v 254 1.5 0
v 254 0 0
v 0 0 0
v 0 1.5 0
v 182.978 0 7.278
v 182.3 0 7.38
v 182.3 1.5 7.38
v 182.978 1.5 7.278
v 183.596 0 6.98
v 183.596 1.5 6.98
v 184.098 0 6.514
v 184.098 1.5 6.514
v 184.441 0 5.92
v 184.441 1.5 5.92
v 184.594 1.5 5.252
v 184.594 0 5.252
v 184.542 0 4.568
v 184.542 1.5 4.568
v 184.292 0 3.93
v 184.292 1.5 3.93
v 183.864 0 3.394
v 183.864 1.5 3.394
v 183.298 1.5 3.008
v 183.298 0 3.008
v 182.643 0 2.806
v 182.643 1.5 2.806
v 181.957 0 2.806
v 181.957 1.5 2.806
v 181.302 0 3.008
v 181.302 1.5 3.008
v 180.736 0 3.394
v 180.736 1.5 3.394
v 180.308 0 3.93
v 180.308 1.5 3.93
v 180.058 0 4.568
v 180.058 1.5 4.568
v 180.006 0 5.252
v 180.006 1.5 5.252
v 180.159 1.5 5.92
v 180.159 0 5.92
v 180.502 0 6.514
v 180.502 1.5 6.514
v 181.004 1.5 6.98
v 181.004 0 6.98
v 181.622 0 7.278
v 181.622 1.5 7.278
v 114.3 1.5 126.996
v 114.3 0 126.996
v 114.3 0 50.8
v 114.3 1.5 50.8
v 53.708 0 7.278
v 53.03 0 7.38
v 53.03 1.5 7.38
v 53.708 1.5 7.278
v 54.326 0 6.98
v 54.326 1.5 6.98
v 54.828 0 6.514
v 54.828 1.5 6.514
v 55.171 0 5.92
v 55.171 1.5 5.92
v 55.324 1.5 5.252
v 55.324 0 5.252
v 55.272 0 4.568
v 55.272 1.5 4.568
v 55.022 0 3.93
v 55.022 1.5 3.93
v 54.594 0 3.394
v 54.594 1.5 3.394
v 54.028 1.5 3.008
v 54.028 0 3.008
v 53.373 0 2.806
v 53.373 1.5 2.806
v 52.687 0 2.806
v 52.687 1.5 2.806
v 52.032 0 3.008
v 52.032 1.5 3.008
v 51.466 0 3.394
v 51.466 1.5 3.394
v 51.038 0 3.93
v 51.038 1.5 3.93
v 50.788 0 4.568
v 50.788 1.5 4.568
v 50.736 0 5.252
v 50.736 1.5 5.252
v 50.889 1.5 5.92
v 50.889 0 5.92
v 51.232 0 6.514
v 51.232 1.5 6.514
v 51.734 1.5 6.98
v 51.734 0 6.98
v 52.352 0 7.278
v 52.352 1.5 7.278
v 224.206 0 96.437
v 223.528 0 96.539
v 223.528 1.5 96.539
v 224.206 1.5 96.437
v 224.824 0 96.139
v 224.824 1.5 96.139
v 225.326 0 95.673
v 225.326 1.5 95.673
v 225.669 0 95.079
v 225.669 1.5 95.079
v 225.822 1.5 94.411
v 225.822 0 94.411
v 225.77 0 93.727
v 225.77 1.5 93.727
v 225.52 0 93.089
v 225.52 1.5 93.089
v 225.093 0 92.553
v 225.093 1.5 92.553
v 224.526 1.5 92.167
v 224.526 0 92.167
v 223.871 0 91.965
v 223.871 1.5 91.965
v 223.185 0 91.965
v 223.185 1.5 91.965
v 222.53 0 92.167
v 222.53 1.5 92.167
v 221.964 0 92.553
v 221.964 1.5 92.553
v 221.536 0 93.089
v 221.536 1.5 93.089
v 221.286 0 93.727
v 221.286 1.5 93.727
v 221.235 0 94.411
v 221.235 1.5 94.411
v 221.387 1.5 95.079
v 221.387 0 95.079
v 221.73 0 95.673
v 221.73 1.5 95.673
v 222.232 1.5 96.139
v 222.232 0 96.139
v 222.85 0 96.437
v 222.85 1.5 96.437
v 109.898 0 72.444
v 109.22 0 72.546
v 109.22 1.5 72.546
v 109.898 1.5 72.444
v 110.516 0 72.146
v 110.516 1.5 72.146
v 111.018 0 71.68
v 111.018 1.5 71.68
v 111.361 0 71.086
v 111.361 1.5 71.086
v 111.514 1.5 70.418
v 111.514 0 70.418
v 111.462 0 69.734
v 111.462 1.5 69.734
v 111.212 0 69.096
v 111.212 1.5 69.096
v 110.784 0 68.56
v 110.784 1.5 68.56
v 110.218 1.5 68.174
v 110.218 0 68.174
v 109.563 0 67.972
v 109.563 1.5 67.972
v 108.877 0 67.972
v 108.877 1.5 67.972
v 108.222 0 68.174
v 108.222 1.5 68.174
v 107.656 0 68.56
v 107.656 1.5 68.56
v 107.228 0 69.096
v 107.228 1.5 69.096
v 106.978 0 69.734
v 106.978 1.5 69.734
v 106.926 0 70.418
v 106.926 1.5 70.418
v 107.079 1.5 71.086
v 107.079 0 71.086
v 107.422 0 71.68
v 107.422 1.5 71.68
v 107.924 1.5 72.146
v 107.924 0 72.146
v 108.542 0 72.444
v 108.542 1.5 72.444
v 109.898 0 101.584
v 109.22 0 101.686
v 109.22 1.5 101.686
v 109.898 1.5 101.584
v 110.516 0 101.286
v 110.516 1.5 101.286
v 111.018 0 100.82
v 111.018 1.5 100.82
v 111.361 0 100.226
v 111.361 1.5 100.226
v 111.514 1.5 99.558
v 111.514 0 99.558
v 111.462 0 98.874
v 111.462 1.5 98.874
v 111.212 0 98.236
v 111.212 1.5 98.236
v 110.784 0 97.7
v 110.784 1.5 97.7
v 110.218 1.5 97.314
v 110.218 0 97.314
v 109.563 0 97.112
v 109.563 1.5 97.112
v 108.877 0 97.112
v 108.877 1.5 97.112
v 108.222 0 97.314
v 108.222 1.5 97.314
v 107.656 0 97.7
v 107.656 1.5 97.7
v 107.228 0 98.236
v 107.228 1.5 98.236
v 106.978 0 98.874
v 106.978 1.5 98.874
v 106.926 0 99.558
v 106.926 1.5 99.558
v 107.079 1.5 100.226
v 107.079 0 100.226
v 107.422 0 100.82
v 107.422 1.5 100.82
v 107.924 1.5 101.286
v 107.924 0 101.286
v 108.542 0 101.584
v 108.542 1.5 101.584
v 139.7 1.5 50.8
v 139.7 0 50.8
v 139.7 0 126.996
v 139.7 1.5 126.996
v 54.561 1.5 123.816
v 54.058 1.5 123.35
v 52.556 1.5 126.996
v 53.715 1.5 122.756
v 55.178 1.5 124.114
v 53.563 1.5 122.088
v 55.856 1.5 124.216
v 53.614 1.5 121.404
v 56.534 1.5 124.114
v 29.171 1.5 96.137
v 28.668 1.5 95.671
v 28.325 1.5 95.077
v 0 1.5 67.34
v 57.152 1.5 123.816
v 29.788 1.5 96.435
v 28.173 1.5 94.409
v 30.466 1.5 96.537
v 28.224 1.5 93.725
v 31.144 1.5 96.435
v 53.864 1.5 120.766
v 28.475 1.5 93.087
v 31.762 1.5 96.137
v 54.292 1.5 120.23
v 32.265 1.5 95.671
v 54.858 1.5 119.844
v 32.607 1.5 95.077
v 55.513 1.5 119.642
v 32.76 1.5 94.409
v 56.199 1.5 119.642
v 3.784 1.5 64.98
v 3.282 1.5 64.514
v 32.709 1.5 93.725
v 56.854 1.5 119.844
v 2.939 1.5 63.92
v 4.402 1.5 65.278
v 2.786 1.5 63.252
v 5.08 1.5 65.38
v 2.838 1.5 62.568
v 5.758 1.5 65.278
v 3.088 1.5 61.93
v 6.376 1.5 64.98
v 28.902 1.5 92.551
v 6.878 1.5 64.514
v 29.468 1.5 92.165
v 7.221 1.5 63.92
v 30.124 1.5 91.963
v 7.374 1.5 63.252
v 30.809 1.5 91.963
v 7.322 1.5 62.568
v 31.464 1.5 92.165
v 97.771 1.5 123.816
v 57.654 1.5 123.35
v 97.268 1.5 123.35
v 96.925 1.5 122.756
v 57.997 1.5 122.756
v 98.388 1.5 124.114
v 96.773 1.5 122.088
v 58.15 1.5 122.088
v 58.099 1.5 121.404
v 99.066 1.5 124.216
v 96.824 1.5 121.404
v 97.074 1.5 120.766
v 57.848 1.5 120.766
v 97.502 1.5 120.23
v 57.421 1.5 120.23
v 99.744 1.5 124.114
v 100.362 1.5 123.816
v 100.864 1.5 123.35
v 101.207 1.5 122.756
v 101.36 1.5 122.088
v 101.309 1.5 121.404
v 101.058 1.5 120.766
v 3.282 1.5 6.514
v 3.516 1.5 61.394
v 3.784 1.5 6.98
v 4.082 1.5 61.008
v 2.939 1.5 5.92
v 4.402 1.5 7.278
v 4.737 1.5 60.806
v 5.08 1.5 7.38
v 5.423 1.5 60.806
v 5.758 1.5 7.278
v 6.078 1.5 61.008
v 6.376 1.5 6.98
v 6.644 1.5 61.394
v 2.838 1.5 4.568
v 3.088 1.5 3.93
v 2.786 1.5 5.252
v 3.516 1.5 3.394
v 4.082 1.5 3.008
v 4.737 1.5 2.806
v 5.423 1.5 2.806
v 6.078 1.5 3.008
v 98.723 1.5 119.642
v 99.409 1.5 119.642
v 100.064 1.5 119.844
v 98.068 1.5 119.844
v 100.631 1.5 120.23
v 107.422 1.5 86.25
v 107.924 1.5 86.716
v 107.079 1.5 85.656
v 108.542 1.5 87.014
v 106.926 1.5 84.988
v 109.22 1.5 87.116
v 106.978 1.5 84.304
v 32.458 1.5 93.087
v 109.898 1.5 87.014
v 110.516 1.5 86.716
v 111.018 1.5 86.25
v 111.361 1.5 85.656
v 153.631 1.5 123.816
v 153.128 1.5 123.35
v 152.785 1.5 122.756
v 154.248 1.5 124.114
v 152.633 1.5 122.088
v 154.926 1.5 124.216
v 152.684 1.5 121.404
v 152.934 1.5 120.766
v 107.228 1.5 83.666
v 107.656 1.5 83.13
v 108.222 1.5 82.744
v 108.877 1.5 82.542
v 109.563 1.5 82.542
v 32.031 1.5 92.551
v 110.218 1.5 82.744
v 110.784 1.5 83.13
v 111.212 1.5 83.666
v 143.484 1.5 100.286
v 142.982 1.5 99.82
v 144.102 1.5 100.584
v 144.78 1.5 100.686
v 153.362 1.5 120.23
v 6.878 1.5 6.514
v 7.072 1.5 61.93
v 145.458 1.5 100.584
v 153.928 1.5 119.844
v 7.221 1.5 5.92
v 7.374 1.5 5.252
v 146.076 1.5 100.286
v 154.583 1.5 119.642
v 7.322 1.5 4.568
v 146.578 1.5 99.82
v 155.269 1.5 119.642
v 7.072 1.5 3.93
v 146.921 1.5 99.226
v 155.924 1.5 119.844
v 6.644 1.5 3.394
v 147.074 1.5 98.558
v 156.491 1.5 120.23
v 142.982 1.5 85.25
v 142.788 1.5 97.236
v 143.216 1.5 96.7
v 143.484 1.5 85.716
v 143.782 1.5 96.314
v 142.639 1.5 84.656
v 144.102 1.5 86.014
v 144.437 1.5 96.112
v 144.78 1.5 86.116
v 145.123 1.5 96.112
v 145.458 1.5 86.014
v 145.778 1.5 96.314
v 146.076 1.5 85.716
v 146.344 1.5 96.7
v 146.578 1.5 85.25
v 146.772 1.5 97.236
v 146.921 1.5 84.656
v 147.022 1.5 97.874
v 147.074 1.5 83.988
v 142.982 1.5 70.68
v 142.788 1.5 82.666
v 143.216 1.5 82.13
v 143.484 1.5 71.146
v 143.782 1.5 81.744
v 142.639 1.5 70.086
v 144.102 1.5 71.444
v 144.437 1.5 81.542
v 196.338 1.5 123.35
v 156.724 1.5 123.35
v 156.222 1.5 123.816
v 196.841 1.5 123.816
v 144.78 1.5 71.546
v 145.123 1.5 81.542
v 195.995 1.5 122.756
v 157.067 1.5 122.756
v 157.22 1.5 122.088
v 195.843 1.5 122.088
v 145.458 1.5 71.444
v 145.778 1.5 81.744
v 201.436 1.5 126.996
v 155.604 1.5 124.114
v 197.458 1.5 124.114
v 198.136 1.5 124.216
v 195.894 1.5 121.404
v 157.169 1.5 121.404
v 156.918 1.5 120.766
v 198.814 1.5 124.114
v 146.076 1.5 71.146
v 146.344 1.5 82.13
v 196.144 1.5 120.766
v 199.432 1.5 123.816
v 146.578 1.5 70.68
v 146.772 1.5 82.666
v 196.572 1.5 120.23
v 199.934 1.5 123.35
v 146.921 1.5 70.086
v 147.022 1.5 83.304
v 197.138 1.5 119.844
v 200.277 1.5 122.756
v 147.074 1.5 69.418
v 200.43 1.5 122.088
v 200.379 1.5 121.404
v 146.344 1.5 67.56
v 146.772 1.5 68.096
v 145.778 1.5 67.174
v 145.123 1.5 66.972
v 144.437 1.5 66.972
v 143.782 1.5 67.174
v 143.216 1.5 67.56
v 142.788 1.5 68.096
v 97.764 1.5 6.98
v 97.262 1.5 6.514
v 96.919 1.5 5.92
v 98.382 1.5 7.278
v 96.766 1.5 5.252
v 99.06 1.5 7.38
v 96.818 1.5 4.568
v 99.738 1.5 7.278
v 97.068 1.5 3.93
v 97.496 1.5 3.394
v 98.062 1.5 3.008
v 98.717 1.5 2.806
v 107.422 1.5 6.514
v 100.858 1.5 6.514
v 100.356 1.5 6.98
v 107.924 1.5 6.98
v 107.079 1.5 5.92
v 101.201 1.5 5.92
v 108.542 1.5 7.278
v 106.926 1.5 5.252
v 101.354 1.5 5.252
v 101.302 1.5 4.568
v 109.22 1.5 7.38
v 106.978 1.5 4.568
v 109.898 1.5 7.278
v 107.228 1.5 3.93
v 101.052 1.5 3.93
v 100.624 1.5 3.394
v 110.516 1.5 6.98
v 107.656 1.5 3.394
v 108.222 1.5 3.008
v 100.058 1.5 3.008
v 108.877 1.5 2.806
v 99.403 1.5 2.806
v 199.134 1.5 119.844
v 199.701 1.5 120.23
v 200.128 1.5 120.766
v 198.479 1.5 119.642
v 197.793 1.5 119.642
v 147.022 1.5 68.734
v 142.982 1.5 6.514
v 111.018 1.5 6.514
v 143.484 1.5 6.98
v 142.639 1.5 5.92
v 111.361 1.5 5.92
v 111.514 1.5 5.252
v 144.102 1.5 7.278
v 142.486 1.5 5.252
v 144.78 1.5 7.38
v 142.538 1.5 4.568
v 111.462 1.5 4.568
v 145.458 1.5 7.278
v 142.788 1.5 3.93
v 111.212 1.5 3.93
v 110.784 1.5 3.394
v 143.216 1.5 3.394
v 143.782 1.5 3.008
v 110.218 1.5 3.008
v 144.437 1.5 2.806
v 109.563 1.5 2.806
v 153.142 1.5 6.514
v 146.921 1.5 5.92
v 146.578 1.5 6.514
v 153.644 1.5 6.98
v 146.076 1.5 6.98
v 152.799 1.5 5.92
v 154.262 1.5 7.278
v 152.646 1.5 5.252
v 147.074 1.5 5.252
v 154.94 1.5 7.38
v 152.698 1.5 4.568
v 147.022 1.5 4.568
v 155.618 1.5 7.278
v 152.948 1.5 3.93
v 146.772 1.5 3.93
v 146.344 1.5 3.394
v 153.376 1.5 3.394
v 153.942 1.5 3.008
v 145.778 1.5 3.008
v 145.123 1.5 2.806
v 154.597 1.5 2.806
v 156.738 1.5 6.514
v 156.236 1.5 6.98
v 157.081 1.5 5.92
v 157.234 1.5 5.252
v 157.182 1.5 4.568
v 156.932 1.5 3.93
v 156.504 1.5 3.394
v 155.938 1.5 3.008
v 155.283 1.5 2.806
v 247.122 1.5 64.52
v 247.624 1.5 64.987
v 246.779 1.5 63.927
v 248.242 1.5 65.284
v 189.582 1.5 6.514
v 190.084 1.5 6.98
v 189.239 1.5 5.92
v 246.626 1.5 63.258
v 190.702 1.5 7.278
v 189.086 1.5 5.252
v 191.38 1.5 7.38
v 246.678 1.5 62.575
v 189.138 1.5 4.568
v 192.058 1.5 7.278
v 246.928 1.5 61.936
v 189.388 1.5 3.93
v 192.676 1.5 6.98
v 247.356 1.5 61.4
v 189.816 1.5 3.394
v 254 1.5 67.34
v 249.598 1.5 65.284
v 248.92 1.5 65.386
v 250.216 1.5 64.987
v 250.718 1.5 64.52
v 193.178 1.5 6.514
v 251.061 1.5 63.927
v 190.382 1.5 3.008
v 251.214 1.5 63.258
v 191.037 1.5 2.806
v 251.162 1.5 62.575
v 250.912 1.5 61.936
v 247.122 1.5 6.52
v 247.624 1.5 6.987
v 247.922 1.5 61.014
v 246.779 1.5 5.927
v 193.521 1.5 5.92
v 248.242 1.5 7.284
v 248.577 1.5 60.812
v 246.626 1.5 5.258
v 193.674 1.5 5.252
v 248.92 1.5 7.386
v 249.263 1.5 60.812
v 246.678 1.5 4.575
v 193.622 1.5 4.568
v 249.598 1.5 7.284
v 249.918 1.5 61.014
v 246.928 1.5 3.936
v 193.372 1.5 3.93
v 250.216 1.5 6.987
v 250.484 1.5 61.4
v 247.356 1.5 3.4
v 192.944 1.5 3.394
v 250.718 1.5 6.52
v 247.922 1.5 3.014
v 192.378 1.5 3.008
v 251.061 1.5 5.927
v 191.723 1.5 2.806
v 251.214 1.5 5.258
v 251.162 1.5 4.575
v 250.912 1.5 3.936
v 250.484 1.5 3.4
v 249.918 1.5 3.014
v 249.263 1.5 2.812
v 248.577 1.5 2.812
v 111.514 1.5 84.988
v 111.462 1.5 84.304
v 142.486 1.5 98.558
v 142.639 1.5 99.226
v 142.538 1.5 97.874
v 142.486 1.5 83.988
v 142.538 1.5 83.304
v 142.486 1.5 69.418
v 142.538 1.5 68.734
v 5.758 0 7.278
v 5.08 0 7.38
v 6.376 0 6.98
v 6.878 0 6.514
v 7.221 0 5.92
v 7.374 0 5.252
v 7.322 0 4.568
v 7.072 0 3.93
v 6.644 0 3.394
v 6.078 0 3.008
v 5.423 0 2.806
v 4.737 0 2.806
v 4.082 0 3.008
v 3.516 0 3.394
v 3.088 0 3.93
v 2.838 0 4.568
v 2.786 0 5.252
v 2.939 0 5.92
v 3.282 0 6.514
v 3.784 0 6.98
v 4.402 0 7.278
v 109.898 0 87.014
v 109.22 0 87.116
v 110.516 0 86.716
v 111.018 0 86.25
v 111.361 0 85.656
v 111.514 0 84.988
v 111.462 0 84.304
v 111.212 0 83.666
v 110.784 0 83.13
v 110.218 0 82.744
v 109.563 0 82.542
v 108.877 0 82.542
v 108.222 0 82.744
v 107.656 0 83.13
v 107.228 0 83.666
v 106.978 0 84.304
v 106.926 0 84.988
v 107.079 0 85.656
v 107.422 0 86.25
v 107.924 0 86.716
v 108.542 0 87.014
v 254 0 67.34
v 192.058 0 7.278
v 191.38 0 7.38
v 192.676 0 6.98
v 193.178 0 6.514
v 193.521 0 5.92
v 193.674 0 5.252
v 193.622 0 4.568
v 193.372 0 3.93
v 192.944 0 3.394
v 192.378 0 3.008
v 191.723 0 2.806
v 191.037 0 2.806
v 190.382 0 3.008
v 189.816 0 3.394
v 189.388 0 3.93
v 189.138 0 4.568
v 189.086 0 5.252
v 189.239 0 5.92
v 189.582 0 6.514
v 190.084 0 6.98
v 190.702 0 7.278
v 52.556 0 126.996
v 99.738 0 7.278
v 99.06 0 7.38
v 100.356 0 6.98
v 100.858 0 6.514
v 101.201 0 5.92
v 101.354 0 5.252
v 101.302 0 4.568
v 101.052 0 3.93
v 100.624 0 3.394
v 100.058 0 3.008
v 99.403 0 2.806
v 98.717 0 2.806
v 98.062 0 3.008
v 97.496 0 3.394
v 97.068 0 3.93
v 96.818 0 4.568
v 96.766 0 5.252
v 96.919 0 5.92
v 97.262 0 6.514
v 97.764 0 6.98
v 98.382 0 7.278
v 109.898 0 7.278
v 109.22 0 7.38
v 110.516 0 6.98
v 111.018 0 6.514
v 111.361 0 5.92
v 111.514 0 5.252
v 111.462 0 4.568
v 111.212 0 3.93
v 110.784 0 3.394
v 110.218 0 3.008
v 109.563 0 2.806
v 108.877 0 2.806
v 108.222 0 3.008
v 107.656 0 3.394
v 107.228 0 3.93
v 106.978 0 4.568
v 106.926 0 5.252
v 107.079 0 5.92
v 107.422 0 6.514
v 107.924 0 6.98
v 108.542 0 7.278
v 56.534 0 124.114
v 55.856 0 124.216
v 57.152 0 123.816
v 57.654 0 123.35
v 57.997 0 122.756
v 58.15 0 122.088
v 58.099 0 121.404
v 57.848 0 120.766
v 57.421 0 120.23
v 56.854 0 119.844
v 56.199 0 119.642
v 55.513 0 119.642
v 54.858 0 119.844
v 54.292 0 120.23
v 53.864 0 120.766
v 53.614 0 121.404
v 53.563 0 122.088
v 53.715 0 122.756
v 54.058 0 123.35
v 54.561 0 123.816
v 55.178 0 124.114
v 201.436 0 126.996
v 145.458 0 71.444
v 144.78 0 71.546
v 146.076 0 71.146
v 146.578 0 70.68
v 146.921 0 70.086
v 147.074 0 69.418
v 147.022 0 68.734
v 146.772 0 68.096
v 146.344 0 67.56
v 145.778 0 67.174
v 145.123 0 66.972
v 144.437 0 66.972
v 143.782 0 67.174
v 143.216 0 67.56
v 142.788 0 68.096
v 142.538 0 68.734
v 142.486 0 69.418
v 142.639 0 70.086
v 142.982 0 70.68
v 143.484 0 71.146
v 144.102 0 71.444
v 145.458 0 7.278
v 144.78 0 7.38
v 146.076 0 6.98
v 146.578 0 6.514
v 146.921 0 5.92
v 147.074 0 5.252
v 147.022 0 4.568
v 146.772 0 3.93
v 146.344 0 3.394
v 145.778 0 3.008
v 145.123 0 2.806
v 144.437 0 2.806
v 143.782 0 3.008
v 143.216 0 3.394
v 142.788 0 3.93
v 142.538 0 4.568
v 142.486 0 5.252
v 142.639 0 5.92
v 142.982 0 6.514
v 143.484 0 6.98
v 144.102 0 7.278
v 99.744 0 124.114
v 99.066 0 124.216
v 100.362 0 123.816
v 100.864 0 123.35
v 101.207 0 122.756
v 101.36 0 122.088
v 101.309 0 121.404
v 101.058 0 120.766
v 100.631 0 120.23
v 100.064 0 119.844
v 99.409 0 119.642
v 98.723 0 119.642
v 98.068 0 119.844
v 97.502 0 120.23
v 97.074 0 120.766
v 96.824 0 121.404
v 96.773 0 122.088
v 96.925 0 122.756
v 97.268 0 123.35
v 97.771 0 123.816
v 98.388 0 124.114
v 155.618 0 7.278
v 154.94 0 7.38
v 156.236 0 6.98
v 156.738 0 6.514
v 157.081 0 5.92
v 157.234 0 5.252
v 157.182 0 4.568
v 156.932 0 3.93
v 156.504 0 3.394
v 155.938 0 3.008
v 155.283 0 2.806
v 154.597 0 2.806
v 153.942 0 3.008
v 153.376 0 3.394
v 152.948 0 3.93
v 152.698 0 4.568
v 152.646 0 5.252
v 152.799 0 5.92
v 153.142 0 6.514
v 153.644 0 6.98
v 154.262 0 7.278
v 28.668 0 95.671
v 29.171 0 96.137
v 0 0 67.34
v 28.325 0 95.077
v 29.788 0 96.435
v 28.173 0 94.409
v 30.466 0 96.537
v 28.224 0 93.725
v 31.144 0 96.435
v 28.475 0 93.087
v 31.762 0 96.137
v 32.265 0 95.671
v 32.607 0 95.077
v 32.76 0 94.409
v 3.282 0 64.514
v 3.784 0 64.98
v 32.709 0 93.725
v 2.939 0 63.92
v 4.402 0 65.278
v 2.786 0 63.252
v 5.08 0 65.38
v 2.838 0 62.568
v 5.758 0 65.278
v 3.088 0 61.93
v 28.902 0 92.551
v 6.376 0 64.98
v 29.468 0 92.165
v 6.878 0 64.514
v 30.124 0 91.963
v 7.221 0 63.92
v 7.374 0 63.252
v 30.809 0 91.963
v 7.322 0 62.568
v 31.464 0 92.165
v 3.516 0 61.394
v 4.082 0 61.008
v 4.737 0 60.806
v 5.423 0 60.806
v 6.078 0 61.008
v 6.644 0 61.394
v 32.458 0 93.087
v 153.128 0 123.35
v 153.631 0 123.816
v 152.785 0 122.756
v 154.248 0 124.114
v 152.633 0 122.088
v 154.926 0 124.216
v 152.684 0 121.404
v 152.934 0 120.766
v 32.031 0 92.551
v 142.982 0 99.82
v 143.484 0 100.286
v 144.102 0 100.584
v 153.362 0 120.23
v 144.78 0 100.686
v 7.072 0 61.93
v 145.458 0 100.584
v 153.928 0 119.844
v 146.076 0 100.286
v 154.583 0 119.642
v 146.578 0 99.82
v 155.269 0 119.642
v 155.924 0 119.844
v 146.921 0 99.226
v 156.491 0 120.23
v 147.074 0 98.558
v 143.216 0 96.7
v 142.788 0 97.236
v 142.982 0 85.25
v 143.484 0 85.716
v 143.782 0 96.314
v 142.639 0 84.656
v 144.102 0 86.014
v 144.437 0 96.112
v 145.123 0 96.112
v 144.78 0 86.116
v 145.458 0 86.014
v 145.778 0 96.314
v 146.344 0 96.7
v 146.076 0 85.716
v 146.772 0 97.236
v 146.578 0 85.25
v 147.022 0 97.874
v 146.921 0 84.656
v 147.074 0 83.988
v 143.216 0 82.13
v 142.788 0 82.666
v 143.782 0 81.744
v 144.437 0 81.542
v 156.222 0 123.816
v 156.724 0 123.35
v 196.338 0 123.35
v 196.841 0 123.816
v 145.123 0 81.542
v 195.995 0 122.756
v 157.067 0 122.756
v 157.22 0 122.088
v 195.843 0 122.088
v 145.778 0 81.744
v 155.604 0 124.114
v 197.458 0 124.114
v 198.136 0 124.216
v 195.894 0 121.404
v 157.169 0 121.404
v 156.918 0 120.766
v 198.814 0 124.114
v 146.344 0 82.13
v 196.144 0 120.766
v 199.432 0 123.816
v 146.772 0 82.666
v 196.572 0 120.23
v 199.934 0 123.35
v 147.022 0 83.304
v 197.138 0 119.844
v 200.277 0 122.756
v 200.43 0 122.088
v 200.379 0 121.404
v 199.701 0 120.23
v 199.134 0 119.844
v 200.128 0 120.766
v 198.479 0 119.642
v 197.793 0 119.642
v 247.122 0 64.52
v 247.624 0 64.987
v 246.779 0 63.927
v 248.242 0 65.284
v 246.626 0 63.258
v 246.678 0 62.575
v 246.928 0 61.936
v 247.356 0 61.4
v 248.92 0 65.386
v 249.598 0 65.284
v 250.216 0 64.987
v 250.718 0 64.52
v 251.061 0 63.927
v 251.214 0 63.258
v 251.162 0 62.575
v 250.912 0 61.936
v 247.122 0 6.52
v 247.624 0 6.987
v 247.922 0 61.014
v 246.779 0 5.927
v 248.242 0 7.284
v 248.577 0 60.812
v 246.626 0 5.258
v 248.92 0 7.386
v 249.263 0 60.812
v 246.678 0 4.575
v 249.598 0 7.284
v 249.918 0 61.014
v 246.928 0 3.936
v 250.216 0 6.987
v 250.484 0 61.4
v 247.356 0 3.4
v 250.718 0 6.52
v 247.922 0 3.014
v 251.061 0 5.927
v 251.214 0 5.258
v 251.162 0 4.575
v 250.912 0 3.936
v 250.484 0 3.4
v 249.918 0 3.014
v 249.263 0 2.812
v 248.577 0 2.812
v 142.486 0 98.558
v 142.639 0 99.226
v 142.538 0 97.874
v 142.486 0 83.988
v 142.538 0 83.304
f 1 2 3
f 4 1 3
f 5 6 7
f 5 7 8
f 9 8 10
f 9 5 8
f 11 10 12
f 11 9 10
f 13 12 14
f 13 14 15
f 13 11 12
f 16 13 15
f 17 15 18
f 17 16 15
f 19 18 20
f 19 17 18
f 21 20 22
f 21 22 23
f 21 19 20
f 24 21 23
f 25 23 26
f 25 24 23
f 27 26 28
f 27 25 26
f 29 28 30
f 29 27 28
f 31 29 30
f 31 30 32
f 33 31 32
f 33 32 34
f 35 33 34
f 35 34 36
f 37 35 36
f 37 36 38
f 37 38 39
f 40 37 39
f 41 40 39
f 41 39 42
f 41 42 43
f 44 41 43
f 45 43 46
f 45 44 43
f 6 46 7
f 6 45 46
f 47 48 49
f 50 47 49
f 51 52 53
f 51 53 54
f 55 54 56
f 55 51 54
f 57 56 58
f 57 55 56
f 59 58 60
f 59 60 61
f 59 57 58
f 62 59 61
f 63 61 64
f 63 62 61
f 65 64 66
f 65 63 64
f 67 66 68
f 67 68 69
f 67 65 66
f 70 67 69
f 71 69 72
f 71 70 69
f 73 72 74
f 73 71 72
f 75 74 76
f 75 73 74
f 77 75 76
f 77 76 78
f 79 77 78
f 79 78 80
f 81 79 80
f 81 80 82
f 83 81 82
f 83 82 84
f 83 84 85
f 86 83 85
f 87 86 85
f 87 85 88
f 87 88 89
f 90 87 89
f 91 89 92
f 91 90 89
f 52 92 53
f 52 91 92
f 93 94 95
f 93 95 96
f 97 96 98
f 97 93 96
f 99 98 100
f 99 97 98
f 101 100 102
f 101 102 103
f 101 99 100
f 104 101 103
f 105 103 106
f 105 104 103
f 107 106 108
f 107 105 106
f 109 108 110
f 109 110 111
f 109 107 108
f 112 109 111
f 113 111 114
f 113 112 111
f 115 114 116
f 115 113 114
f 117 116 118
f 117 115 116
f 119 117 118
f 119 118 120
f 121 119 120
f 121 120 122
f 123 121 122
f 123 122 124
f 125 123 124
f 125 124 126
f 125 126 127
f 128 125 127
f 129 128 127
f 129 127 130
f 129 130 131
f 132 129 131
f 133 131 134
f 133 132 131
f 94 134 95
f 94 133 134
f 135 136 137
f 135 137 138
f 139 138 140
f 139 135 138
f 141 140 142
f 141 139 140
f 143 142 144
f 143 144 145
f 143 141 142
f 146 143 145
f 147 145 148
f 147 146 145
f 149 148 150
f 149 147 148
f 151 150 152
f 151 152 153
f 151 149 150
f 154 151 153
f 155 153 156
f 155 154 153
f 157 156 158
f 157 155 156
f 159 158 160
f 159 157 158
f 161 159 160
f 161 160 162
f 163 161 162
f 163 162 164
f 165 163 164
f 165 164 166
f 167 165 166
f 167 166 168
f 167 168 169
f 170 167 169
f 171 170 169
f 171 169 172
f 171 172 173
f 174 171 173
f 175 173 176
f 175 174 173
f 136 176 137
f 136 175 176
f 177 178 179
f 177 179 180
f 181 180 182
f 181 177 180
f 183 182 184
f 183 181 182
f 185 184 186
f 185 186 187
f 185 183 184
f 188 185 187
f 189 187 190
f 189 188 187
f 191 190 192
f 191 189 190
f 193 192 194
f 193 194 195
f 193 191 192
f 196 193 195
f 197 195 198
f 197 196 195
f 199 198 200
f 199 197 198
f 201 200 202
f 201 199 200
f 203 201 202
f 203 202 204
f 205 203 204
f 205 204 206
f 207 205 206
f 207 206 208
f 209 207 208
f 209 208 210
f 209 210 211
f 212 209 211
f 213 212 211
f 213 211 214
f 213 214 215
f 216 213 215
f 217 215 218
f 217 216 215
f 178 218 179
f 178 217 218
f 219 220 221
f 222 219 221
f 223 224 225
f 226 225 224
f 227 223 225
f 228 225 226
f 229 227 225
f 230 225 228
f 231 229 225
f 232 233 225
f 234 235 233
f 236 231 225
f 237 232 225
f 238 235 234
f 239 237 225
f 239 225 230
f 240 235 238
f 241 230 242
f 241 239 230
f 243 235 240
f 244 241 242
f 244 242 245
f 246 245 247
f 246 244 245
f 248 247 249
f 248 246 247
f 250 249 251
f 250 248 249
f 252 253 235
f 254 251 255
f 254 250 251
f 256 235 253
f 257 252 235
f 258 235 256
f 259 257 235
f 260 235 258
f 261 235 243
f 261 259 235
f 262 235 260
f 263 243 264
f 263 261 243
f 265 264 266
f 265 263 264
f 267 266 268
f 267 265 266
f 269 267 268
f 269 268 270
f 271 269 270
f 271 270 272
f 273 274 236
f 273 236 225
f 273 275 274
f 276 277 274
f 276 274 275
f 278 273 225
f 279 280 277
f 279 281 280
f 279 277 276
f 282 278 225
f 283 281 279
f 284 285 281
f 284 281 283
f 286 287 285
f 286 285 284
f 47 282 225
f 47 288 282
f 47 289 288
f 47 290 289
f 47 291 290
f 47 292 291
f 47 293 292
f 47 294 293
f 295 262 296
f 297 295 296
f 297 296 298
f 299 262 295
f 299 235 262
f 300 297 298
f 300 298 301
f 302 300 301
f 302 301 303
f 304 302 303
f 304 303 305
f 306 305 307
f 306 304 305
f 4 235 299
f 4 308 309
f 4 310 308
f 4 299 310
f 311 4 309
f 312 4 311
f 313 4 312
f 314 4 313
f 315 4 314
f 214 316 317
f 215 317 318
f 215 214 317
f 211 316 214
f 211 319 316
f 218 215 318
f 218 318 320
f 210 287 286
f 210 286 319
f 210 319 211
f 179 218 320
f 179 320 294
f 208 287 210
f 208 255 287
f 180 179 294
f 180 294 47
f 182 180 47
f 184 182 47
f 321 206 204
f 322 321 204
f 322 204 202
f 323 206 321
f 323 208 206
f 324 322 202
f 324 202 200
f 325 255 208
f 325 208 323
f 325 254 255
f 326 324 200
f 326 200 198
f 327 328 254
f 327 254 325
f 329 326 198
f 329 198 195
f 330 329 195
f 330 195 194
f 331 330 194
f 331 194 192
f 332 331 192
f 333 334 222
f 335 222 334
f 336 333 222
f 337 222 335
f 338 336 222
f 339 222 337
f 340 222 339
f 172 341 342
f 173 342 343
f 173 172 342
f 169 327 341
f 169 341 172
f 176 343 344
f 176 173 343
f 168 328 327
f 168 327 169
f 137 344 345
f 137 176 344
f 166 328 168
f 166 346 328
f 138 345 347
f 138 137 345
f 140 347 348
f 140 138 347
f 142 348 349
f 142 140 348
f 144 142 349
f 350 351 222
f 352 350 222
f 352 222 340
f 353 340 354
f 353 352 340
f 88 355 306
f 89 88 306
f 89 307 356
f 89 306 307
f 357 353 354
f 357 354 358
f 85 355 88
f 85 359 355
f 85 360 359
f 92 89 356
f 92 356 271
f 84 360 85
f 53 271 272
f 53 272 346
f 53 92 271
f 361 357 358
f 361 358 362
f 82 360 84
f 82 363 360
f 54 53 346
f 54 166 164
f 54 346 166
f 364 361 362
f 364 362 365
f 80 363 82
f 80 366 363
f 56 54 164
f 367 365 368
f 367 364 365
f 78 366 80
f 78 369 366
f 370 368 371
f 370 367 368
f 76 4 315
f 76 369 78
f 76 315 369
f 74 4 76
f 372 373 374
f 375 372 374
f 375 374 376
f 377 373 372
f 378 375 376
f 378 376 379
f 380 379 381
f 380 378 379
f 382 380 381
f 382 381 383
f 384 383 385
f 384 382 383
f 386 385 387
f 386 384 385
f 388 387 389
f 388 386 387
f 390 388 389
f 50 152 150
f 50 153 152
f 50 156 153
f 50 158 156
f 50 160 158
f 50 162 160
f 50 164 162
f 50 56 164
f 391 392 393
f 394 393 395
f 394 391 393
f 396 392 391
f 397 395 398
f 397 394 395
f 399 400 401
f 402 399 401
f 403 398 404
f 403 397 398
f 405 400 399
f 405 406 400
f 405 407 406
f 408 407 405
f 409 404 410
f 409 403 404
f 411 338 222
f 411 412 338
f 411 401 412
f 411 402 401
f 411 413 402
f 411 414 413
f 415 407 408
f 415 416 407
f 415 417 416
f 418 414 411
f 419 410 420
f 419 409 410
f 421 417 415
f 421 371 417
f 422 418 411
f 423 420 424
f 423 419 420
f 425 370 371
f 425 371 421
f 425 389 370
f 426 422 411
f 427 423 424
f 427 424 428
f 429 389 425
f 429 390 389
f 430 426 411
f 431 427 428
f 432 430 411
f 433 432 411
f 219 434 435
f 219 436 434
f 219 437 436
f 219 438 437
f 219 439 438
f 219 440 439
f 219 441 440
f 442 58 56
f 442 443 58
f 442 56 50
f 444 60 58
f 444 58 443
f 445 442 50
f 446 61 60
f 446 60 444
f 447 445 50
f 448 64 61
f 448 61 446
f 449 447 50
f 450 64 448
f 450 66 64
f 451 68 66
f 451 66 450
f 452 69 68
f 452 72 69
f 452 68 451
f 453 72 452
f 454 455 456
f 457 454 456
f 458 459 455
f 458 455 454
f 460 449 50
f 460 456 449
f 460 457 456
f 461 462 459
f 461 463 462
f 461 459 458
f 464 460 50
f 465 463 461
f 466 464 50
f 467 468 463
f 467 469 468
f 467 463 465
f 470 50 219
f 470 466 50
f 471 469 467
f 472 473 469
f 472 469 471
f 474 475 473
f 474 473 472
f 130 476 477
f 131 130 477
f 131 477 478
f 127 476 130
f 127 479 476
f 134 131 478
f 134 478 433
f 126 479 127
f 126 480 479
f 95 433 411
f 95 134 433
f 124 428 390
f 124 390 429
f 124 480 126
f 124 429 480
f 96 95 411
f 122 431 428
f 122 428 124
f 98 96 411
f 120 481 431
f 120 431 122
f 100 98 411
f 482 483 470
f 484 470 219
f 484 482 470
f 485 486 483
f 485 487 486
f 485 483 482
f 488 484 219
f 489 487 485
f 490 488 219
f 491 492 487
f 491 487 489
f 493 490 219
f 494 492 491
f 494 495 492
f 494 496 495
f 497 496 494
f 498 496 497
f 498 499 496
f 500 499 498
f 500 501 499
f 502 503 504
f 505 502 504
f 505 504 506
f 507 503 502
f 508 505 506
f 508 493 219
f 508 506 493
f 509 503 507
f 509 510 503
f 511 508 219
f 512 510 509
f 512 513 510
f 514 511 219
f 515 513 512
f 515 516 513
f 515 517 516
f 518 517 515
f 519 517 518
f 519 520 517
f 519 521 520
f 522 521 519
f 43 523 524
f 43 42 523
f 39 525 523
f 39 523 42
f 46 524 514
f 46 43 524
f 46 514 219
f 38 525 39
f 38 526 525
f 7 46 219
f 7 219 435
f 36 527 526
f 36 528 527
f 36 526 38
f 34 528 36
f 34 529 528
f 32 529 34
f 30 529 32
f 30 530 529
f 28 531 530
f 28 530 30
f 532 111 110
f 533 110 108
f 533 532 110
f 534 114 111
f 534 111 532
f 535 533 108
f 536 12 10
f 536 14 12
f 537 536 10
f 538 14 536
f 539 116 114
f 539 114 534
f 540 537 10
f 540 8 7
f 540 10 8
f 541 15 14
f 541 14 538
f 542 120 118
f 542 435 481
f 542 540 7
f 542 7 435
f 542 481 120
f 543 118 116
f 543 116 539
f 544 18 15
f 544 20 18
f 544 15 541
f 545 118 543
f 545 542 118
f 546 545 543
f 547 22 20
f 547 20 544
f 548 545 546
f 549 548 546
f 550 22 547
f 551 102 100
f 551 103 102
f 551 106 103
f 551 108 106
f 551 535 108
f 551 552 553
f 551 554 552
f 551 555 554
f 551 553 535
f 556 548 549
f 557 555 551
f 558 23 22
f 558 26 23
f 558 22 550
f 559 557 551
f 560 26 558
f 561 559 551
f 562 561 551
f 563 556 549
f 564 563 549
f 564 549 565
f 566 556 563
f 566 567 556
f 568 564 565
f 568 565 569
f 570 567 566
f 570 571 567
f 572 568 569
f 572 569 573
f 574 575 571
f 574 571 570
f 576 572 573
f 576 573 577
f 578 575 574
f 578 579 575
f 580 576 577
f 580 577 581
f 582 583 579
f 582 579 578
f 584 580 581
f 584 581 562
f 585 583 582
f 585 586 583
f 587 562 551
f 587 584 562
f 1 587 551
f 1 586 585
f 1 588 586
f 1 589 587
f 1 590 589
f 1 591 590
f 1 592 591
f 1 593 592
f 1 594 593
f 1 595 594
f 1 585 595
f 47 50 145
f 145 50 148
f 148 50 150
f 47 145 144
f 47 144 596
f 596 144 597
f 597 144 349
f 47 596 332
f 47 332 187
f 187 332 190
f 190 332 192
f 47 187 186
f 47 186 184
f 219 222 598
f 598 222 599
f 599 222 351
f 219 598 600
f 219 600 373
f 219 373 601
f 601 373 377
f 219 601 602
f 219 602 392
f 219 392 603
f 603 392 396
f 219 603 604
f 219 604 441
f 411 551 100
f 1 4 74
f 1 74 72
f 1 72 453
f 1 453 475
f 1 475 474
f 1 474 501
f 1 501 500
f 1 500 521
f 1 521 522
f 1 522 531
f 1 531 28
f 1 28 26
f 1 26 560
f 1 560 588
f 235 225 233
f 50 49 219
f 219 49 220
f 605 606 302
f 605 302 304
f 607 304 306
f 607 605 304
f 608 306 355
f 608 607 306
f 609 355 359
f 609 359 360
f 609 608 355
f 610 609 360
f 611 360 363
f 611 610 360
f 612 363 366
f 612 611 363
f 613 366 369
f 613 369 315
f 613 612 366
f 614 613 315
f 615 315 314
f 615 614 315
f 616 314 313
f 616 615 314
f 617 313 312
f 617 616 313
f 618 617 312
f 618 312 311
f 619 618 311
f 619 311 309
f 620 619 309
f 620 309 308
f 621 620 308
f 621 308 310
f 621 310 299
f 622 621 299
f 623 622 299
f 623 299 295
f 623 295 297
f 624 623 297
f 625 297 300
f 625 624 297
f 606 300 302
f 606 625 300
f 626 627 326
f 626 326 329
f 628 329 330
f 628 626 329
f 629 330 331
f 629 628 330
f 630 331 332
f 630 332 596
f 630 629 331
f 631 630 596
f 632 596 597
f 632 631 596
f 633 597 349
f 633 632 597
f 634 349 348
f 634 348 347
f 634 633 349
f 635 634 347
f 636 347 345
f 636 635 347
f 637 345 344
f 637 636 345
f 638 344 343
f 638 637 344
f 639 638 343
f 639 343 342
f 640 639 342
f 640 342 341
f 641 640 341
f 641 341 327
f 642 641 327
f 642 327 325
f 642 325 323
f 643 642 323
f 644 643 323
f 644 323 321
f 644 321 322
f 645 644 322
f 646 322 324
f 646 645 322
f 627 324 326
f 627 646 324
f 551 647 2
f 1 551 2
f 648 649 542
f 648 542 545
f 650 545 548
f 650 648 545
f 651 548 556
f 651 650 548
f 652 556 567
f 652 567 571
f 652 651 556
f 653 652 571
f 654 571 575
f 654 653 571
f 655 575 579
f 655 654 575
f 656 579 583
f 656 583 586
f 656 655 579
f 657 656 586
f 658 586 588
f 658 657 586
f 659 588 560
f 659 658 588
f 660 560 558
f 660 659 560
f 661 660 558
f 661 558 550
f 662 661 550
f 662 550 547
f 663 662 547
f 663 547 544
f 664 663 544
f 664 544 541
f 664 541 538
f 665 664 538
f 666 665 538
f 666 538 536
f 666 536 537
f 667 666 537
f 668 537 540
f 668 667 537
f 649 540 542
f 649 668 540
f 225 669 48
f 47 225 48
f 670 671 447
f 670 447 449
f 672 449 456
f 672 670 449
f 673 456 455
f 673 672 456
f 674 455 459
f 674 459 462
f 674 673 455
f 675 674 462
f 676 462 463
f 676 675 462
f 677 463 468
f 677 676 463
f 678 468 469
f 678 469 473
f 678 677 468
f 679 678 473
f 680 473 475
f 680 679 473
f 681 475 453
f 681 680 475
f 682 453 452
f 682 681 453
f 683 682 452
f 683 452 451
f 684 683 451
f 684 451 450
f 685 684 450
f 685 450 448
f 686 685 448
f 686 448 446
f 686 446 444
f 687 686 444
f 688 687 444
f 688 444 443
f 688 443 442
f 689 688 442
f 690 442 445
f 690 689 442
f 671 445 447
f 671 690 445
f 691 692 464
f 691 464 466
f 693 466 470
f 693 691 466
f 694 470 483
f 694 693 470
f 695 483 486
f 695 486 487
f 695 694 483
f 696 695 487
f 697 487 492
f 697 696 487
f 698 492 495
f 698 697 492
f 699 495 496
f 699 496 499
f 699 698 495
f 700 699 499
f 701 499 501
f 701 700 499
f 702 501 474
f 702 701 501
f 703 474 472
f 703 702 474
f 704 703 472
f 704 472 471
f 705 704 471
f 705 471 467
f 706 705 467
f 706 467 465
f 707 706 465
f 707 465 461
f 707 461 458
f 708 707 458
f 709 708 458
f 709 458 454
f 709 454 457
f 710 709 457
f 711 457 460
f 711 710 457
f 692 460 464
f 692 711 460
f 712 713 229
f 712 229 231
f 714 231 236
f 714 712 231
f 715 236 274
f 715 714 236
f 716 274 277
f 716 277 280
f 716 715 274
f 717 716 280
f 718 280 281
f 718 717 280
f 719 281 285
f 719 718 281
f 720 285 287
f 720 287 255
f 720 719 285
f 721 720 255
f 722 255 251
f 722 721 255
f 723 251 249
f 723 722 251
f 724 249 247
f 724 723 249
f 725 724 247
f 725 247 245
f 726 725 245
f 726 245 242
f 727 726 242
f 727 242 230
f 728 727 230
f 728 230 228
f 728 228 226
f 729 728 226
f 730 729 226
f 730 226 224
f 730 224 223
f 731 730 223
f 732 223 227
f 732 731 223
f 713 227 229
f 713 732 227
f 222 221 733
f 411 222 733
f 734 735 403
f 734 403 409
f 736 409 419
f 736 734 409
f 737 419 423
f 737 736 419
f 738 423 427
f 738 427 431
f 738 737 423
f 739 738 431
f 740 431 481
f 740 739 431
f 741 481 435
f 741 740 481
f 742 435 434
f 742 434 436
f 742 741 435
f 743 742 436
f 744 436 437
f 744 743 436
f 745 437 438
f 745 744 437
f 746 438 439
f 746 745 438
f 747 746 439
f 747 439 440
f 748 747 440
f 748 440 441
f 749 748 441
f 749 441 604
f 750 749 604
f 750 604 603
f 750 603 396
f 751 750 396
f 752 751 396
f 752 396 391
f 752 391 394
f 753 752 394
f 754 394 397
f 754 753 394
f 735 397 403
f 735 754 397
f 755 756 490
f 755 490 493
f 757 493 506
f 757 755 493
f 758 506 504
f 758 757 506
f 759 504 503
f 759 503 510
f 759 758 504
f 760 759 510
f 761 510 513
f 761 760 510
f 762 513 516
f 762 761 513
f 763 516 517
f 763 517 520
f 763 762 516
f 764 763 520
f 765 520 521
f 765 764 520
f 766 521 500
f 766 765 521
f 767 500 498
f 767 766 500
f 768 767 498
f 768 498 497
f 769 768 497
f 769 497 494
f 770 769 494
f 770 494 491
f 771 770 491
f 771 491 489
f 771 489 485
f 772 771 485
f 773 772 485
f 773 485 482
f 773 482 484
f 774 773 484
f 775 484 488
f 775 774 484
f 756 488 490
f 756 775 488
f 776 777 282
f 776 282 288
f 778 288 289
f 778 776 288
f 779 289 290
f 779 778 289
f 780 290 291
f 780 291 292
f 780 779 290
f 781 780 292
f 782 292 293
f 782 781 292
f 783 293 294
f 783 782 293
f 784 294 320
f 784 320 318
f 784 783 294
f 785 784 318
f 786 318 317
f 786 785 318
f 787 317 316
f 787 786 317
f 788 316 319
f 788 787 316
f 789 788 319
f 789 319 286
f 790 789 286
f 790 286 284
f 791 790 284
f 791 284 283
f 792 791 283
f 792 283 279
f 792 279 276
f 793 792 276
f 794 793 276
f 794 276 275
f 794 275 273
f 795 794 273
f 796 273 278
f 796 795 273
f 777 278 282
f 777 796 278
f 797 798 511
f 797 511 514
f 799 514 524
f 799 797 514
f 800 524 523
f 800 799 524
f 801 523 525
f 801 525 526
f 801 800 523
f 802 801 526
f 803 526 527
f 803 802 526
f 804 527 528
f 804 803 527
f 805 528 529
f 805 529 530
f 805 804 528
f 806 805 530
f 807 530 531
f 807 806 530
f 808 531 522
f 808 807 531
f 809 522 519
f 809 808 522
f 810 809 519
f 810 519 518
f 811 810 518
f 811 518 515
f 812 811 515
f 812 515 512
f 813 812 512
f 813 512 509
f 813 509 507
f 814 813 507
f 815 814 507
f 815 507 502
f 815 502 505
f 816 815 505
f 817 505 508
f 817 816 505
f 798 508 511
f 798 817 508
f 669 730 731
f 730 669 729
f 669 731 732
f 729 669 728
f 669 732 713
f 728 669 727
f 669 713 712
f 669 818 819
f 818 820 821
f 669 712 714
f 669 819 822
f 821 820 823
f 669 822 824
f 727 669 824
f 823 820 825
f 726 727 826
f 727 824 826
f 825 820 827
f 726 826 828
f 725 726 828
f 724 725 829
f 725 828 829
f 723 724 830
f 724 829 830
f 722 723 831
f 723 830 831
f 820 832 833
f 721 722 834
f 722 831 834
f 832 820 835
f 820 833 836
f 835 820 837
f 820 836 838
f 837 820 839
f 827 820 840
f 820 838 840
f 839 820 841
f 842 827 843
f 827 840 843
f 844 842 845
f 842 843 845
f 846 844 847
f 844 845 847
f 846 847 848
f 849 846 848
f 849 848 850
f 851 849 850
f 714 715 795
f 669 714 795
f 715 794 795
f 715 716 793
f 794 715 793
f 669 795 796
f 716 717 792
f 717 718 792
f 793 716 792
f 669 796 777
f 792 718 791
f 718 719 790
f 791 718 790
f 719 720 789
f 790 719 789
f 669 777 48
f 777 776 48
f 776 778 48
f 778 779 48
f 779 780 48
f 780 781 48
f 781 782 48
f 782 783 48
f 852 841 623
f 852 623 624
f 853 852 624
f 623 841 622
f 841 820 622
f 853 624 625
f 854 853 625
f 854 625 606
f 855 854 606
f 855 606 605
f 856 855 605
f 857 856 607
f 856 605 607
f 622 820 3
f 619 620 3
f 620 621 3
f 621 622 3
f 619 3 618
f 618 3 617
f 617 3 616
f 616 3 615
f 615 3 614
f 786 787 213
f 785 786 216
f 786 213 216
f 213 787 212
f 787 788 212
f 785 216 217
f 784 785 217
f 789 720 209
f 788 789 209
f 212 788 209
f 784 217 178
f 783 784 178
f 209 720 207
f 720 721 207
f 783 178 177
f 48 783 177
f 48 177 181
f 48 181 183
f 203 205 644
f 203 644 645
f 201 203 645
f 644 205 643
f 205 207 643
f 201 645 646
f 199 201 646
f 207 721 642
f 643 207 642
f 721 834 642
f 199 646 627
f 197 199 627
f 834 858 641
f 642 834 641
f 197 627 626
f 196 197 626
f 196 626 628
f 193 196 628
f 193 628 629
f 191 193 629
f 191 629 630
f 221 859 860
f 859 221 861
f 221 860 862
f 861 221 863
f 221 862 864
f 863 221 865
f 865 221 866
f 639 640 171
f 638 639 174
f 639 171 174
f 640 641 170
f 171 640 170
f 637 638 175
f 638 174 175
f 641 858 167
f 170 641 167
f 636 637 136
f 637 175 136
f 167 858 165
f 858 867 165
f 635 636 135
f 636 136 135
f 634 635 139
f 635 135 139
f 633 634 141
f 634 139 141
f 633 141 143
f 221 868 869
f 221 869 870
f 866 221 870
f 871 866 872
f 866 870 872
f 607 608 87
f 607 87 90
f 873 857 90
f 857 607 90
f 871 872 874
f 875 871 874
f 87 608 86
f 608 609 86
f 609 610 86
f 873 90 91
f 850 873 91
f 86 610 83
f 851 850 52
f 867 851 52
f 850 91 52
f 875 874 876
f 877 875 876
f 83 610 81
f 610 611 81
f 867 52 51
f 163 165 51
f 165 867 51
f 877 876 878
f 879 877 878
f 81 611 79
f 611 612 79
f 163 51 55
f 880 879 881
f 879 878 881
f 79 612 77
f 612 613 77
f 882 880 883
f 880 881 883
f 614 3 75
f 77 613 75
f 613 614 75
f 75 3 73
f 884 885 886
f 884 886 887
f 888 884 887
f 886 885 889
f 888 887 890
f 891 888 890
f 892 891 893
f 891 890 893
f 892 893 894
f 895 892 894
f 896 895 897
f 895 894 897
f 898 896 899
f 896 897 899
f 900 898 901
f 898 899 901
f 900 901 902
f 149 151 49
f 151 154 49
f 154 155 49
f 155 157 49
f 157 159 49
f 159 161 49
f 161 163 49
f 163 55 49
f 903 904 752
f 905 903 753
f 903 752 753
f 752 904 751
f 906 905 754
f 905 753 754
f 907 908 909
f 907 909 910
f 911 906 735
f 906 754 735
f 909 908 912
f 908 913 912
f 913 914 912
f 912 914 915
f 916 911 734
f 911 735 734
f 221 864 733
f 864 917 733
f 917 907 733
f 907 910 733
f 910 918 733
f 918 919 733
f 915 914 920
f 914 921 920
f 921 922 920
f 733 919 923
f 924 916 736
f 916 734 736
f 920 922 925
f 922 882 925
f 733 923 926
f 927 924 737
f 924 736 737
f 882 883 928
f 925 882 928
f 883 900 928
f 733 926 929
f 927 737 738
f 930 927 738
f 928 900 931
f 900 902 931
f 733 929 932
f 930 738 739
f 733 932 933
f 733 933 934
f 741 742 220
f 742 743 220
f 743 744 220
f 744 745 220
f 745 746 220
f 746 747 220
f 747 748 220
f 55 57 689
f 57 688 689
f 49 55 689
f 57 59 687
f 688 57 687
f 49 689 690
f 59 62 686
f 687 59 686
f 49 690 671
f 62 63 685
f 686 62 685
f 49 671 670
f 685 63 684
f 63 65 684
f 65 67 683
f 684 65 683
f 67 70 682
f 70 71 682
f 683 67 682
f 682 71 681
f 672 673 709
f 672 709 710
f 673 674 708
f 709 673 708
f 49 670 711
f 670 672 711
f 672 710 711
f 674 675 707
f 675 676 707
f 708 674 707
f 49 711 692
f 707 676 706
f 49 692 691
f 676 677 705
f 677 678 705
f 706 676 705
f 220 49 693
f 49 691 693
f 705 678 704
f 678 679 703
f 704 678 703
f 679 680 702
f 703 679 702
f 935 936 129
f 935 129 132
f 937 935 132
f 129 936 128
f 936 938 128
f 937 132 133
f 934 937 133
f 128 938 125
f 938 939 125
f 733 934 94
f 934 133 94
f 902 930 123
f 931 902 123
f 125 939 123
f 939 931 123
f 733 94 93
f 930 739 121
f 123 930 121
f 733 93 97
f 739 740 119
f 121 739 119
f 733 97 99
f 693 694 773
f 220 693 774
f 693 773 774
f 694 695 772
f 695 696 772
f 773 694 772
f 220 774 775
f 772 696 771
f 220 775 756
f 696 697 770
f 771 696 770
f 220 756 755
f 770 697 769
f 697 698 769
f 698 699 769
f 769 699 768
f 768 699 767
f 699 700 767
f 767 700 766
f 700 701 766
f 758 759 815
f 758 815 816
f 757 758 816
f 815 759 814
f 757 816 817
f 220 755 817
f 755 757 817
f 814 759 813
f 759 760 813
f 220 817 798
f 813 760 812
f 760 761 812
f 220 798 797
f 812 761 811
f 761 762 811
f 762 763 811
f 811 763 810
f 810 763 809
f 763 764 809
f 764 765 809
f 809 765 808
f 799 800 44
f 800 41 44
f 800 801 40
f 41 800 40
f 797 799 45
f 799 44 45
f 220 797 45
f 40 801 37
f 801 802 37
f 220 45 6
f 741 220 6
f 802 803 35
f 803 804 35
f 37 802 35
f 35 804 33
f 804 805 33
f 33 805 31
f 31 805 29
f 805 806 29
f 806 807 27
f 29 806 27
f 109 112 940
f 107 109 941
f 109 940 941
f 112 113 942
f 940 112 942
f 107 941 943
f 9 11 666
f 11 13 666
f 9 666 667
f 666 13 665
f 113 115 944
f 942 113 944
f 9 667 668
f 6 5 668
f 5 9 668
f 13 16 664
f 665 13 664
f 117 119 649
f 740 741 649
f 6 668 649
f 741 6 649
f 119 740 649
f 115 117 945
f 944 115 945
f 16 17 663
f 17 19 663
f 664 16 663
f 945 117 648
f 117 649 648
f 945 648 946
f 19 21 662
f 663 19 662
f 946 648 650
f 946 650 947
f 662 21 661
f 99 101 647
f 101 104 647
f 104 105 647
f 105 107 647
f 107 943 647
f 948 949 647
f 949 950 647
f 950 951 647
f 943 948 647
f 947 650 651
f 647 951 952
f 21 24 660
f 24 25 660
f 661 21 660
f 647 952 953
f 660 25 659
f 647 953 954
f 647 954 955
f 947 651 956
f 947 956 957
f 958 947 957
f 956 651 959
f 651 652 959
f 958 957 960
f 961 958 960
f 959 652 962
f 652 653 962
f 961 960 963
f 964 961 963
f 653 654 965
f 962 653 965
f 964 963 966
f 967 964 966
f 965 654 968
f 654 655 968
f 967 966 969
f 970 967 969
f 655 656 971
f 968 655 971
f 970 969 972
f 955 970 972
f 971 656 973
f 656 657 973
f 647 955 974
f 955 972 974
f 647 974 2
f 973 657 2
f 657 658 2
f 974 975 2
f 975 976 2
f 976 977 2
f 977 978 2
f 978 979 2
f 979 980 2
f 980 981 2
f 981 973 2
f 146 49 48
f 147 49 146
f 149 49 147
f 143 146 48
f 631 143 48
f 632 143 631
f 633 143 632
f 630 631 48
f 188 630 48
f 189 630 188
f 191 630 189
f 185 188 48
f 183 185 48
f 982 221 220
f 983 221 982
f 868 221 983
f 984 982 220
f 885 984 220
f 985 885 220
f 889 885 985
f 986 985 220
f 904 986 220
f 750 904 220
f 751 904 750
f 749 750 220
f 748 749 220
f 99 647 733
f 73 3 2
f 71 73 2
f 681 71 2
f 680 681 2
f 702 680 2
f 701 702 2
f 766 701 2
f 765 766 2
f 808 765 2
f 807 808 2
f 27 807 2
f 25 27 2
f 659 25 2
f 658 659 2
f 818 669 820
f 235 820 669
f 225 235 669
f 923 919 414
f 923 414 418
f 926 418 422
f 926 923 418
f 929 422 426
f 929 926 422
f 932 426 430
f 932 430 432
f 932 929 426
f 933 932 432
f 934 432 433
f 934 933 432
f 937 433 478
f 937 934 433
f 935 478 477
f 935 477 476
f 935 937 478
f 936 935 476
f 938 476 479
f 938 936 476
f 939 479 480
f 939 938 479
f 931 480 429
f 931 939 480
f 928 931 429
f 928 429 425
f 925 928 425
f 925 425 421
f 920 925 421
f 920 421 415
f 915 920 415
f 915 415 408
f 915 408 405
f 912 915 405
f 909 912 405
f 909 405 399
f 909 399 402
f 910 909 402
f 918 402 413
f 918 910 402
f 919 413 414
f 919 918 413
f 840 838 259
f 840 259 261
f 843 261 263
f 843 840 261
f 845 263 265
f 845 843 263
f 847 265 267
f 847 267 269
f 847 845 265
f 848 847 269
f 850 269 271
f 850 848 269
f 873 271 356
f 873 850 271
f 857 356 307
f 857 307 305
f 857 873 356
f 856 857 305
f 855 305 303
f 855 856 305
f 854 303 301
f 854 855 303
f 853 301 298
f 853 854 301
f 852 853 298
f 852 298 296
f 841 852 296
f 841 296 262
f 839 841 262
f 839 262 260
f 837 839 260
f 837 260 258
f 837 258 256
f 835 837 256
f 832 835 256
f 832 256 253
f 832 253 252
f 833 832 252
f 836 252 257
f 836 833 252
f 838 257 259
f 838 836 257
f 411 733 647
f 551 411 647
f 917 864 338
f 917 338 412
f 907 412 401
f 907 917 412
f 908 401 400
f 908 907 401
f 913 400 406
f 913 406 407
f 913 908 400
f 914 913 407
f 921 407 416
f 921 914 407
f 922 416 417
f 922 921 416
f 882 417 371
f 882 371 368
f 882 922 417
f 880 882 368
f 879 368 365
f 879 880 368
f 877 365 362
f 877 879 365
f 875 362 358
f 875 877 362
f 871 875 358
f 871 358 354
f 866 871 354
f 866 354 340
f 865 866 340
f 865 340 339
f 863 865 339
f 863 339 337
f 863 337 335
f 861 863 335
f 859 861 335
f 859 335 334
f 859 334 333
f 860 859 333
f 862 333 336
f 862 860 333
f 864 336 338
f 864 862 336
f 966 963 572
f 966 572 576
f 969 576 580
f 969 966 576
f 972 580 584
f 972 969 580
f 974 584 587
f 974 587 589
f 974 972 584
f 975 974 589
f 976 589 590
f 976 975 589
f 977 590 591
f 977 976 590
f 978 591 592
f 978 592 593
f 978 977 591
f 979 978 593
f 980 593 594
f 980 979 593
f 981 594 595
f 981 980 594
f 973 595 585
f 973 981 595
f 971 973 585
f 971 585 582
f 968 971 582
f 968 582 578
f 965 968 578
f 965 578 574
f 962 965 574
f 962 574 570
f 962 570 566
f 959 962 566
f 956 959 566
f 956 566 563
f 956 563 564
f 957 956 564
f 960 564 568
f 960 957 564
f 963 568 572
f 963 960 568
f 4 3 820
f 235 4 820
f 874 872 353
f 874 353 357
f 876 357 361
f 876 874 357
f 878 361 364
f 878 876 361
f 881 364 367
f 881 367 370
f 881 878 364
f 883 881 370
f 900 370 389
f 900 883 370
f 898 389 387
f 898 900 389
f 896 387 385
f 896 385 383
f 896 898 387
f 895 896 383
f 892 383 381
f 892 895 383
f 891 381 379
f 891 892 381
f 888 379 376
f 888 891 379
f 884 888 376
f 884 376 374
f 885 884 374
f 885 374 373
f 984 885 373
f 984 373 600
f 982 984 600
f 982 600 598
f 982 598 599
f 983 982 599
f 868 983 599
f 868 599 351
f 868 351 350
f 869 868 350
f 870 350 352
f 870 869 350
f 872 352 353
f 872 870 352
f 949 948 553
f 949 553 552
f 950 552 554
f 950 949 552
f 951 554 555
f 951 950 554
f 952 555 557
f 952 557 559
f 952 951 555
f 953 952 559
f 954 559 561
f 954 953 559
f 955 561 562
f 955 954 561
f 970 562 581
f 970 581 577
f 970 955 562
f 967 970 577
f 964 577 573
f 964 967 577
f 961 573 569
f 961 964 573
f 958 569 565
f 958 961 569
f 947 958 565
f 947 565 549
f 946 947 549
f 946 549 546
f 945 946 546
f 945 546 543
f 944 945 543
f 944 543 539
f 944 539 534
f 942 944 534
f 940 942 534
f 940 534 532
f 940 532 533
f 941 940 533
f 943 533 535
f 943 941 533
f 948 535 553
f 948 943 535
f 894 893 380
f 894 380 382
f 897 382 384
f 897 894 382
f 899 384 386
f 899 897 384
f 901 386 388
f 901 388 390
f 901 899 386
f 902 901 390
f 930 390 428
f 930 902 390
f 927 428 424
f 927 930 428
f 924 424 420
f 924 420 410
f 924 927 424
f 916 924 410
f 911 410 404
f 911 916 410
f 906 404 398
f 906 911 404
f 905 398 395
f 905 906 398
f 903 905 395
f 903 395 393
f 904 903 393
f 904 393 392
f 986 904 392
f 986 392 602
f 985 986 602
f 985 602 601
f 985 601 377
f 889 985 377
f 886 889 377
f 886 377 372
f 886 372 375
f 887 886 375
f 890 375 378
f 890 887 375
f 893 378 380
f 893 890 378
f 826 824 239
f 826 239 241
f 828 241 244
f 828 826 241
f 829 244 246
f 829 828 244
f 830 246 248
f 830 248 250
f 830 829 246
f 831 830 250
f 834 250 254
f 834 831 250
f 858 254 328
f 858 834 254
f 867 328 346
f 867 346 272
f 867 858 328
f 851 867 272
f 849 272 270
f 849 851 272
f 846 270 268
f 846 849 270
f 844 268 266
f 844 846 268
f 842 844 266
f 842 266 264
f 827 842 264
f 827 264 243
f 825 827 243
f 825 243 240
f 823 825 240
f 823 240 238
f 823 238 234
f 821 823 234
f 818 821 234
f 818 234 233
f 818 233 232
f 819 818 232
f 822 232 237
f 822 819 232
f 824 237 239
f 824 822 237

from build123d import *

# Parameters (mm, degrees)
SKETCH1_R           = 2.3
BOSS_EXTRUDE1_DEPTH = 1.5


with BuildPart() as part:
    # Sketch1 → Boss-Extrude1 (new body)
    with BuildSketch(Plane(origin=(0, 0, 0), x_dir=(1, 0, 0), z_dir=(0, 1, 0))):
        Polygon((52.556347973, -126.995854643), (114.3, -126.995854643), (114.3, -50.8), (139.7, -50.8), (139.7, -126.995854643), (201.436197447, -126.995854643), (254, -67.34), (254, 0), (0, 0), (0, -67.34), align=None)
        with Locations(Location((5.08, -5.08, 0), (0, 0, 270))):
            Circle(SKETCH1_R, mode=Mode.SUBTRACT)
        with Locations(Location((53.03, -5.08, 0), (0, 0, 270))):
            Circle(SKETCH1_R, mode=Mode.SUBTRACT)
        with Locations(Location((99.06, -5.08, 0), (0, 0, 270))):
            Circle(SKETCH1_R, mode=Mode.SUBTRACT)
        with Locations(Location((5.08, -63.08, 0), (0, 0, 270))):
            Circle(SKETCH1_R, mode=Mode.SUBTRACT)
        with Locations(Location((99.066197447, -121.915854643, 0), (0, 0, 270))):
            Circle(SKETCH1_R, mode=Mode.SUBTRACT)
        with Locations(Location((55.856197447, -121.915854643, 0), (0, 0, 270))):
            Circle(SKETCH1_R, mode=Mode.SUBTRACT)
        with Locations(Location((182.3, -5.08, 0), (0, 0, 270))):
            Circle(SKETCH1_R, mode=Mode.SUBTRACT)
        with Locations(Location((248.919999642, -5.086414302, 0), (0, 0, 270))):
            Circle(SKETCH1_R, mode=Mode.SUBTRACT)
        with Locations(Location((248.92, -63.086414302, 0), (0, 0, 270))):
            Circle(SKETCH1_R, mode=Mode.SUBTRACT)
        with Locations(Location((198.136197447, -121.915854643, 0), (0, 0, 270))):
            Circle(SKETCH1_R, mode=Mode.SUBTRACT)
        with Locations(Location((154.926197447, -121.915854643, 0), (0, 0, 270))):
            Circle(SKETCH1_R, mode=Mode.SUBTRACT)
        with Locations(Location((144.78, -5.08, 0), (0, 0, 270))):
            Circle(SKETCH1_R, mode=Mode.SUBTRACT)
        with Locations(Location((109.22, -5.08, 0), (0, 0, 270))):
            Circle(SKETCH1_R, mode=Mode.SUBTRACT)
        with Locations(Location((154.94, -5.08, 0), (0, 0, 270))):
            Circle(SKETCH1_R, mode=Mode.SUBTRACT)
        with Locations(Location((191.38, -5.08, 0), (0, 0, 270))):
            Circle(SKETCH1_R, mode=Mode.SUBTRACT)
        with Locations(Location((223.528114705, -94.239074881, 0), (0, 0, 270))):
            Circle(SKETCH1_R, mode=Mode.SUBTRACT)
        with Locations(Location((144.78, -98.385854643, 0), (0, 0, 270))):
            Circle(SKETCH1_R, mode=Mode.SUBTRACT)
        with Locations(Location((144.78, -83.815854643, 0), (0, 0, 270))):
            Circle(SKETCH1_R, mode=Mode.SUBTRACT)
        with Locations(Location((144.78, -69.245854643, 0), (0, 0, 270))):
            Circle(SKETCH1_R, mode=Mode.SUBTRACT)
        with Locations(Location((109.22, -70.245854643, 0), (0, 0, 270))):
            Circle(SKETCH1_R, mode=Mode.SUBTRACT)
        with Locations(Location((109.22, -84.815854643, 0), (0, 0, 270))):
            Circle(SKETCH1_R, mode=Mode.SUBTRACT)
        with Locations(Location((109.22, -99.385854643, 0), (0, 0, 270))):
            Circle(SKETCH1_R, mode=Mode.SUBTRACT)
        with Locations(Location((30.466395088, -94.237134728, 0), (0, 0, 270))):
            Circle(SKETCH1_R, mode=Mode.SUBTRACT)
    extrude(amount=BOSS_EXTRUDE1_DEPTH)


solid = part.part
